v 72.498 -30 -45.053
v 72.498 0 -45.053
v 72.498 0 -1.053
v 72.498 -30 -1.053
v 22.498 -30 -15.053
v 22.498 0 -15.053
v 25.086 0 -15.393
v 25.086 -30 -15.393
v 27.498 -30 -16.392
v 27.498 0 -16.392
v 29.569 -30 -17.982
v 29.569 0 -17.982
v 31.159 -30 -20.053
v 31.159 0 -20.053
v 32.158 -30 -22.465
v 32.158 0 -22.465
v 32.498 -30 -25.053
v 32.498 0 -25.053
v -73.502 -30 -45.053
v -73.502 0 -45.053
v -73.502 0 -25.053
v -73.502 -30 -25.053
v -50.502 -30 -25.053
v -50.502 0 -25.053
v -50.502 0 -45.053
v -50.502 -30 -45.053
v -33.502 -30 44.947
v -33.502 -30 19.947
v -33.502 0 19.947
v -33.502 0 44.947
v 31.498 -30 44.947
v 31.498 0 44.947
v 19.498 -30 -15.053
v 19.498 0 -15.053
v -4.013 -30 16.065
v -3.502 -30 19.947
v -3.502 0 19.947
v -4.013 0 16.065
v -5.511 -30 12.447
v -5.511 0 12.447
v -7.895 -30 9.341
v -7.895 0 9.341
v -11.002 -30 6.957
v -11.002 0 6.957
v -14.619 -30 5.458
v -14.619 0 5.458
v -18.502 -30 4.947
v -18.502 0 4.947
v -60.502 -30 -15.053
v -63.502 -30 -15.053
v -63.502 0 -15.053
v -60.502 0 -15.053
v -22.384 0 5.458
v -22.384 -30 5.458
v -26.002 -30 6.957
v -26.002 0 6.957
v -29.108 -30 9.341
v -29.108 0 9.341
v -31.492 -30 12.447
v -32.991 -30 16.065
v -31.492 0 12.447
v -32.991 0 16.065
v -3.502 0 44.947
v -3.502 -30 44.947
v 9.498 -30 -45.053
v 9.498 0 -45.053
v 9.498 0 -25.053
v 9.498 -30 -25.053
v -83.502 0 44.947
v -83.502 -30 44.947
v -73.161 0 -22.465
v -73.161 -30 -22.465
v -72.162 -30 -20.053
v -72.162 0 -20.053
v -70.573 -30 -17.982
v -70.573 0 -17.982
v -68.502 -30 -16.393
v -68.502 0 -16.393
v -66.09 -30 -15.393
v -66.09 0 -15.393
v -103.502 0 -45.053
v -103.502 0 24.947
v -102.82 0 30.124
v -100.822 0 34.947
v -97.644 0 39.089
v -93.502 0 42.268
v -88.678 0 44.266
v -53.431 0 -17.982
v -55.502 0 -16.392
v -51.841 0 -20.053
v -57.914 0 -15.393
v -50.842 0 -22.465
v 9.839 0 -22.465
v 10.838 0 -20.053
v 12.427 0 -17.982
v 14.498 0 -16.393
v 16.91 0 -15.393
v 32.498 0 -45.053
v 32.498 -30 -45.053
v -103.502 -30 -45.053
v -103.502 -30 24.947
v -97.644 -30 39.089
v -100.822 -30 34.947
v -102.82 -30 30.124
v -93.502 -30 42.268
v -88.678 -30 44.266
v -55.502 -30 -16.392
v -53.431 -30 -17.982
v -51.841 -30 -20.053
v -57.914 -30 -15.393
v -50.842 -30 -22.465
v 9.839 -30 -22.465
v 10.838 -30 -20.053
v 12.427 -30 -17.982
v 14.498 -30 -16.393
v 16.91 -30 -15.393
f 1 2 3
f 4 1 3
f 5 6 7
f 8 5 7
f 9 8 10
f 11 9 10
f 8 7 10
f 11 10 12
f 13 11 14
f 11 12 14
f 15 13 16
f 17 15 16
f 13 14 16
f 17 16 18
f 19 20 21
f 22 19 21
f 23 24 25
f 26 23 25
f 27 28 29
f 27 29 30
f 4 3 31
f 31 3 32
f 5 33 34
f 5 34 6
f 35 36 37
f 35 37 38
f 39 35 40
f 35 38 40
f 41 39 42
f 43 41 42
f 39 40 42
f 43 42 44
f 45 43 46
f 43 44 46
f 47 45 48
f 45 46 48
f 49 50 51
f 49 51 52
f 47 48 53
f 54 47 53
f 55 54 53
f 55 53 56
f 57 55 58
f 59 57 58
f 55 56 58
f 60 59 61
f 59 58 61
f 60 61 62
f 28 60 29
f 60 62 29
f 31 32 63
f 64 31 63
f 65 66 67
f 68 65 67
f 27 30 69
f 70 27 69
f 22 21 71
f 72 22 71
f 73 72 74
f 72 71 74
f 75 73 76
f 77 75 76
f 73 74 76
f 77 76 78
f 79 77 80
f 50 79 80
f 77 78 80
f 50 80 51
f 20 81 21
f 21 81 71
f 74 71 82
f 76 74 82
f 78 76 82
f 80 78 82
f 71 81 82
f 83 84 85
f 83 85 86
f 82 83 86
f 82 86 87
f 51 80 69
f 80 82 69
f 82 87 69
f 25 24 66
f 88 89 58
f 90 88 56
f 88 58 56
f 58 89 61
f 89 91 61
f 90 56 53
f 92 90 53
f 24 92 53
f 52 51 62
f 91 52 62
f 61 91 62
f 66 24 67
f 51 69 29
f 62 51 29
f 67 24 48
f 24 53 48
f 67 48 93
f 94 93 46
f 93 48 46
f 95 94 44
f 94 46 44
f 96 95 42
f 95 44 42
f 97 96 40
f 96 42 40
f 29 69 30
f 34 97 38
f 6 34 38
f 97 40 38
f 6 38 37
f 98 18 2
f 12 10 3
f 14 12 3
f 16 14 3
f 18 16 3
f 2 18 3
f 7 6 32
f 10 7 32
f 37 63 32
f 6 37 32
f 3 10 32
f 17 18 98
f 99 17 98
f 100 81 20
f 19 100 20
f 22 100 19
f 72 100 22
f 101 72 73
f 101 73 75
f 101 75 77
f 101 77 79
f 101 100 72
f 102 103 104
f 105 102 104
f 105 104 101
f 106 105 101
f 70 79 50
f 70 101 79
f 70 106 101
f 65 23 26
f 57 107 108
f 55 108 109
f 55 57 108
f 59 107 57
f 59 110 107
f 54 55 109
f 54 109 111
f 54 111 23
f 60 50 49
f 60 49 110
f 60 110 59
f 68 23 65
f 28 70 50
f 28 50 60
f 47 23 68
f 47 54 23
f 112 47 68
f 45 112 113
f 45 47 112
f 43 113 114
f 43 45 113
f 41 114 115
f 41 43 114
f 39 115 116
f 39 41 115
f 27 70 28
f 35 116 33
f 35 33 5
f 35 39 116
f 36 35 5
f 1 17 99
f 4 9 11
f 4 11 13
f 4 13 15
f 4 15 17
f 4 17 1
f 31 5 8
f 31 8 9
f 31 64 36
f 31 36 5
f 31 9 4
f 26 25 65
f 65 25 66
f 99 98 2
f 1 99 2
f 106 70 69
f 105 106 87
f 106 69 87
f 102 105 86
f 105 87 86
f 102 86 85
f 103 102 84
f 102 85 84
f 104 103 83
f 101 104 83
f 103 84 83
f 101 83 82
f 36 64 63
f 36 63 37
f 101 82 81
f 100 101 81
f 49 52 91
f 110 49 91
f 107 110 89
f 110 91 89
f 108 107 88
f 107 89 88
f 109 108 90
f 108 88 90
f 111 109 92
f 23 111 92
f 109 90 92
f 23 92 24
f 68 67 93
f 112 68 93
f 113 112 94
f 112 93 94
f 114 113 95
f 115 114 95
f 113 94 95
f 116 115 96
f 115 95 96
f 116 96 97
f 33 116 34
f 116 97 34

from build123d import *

# Parameters (mm, degrees)
F1_DEPTH = 30


with BuildPart() as f1:
    # F0 (on Front) → F1 (new body)
    with BuildSketch(Plane.XZ):
        with BuildLine():
            Line((-103.501727, 24.947246), (-103.501727, -45.052754))
            Line((-103.501727, -45.052754), (-73.501727, -45.052754))
            Line((-73.501727, -45.052754), (-73.501727, -25.052754))
            ThreePointArc((-73.501727, -25.052754), (-70.572794, -17.981686), (-63.501727, -15.052754))
            Line((-63.501727, -15.052754), (-60.501727, -15.052754))
            ThreePointArc((-60.501727, -15.052754), (-53.430659, -17.981686), (-50.501727, -25.052754))
            Line((-50.501727, -25.052754), (-50.501727, -45.052754))
            Line((-50.501727, -45.052754), (9.498273, -45.052754))
            Line((9.498273, -45.052754), (9.498273, -25.052754))
            ThreePointArc((9.498273, -25.052754), (12.427206, -17.981686), (19.498273, -15.052754))
            Line((19.498273, -15.052754), (22.498273, -15.052754))
            ThreePointArc((22.498273, -15.052754), (29.569341, -17.981686), (32.498273, -25.052754))
            Line((32.498273, -25.052754), (32.498273, -45.052754))
            Line((32.498273, -45.052754), (72.498273, -45.052754))
            Line((72.498273, -45.052754), (72.498273, -1.052754))
            Line((72.498273, -1.052754), (31.498273, 44.947246))
            Line((31.498273, 44.947246), (-3.501727, 44.947246))
            Line((-3.501727, 44.947246), (-3.501727, 19.947246))
            ThreePointArc((-3.501727, 19.947246), (-7.895125, 9.340645), (-18.501727, 4.947246))
            ThreePointArc((-18.501727, 4.947246), (-29.108328, 9.340645), (-33.501727, 19.947246))
            Line((-33.501727, 19.947246), (-33.501727, 44.947246))
            Line((-33.501727, 44.947246), (-83.501727, 44.947246))
            ThreePointArc((-83.501727, 44.947246), (-97.643862, 39.089382), (-103.501727, 24.947246))
        make_face()
    extrude(amount=F1_DEPTH)


solid = f1.part
